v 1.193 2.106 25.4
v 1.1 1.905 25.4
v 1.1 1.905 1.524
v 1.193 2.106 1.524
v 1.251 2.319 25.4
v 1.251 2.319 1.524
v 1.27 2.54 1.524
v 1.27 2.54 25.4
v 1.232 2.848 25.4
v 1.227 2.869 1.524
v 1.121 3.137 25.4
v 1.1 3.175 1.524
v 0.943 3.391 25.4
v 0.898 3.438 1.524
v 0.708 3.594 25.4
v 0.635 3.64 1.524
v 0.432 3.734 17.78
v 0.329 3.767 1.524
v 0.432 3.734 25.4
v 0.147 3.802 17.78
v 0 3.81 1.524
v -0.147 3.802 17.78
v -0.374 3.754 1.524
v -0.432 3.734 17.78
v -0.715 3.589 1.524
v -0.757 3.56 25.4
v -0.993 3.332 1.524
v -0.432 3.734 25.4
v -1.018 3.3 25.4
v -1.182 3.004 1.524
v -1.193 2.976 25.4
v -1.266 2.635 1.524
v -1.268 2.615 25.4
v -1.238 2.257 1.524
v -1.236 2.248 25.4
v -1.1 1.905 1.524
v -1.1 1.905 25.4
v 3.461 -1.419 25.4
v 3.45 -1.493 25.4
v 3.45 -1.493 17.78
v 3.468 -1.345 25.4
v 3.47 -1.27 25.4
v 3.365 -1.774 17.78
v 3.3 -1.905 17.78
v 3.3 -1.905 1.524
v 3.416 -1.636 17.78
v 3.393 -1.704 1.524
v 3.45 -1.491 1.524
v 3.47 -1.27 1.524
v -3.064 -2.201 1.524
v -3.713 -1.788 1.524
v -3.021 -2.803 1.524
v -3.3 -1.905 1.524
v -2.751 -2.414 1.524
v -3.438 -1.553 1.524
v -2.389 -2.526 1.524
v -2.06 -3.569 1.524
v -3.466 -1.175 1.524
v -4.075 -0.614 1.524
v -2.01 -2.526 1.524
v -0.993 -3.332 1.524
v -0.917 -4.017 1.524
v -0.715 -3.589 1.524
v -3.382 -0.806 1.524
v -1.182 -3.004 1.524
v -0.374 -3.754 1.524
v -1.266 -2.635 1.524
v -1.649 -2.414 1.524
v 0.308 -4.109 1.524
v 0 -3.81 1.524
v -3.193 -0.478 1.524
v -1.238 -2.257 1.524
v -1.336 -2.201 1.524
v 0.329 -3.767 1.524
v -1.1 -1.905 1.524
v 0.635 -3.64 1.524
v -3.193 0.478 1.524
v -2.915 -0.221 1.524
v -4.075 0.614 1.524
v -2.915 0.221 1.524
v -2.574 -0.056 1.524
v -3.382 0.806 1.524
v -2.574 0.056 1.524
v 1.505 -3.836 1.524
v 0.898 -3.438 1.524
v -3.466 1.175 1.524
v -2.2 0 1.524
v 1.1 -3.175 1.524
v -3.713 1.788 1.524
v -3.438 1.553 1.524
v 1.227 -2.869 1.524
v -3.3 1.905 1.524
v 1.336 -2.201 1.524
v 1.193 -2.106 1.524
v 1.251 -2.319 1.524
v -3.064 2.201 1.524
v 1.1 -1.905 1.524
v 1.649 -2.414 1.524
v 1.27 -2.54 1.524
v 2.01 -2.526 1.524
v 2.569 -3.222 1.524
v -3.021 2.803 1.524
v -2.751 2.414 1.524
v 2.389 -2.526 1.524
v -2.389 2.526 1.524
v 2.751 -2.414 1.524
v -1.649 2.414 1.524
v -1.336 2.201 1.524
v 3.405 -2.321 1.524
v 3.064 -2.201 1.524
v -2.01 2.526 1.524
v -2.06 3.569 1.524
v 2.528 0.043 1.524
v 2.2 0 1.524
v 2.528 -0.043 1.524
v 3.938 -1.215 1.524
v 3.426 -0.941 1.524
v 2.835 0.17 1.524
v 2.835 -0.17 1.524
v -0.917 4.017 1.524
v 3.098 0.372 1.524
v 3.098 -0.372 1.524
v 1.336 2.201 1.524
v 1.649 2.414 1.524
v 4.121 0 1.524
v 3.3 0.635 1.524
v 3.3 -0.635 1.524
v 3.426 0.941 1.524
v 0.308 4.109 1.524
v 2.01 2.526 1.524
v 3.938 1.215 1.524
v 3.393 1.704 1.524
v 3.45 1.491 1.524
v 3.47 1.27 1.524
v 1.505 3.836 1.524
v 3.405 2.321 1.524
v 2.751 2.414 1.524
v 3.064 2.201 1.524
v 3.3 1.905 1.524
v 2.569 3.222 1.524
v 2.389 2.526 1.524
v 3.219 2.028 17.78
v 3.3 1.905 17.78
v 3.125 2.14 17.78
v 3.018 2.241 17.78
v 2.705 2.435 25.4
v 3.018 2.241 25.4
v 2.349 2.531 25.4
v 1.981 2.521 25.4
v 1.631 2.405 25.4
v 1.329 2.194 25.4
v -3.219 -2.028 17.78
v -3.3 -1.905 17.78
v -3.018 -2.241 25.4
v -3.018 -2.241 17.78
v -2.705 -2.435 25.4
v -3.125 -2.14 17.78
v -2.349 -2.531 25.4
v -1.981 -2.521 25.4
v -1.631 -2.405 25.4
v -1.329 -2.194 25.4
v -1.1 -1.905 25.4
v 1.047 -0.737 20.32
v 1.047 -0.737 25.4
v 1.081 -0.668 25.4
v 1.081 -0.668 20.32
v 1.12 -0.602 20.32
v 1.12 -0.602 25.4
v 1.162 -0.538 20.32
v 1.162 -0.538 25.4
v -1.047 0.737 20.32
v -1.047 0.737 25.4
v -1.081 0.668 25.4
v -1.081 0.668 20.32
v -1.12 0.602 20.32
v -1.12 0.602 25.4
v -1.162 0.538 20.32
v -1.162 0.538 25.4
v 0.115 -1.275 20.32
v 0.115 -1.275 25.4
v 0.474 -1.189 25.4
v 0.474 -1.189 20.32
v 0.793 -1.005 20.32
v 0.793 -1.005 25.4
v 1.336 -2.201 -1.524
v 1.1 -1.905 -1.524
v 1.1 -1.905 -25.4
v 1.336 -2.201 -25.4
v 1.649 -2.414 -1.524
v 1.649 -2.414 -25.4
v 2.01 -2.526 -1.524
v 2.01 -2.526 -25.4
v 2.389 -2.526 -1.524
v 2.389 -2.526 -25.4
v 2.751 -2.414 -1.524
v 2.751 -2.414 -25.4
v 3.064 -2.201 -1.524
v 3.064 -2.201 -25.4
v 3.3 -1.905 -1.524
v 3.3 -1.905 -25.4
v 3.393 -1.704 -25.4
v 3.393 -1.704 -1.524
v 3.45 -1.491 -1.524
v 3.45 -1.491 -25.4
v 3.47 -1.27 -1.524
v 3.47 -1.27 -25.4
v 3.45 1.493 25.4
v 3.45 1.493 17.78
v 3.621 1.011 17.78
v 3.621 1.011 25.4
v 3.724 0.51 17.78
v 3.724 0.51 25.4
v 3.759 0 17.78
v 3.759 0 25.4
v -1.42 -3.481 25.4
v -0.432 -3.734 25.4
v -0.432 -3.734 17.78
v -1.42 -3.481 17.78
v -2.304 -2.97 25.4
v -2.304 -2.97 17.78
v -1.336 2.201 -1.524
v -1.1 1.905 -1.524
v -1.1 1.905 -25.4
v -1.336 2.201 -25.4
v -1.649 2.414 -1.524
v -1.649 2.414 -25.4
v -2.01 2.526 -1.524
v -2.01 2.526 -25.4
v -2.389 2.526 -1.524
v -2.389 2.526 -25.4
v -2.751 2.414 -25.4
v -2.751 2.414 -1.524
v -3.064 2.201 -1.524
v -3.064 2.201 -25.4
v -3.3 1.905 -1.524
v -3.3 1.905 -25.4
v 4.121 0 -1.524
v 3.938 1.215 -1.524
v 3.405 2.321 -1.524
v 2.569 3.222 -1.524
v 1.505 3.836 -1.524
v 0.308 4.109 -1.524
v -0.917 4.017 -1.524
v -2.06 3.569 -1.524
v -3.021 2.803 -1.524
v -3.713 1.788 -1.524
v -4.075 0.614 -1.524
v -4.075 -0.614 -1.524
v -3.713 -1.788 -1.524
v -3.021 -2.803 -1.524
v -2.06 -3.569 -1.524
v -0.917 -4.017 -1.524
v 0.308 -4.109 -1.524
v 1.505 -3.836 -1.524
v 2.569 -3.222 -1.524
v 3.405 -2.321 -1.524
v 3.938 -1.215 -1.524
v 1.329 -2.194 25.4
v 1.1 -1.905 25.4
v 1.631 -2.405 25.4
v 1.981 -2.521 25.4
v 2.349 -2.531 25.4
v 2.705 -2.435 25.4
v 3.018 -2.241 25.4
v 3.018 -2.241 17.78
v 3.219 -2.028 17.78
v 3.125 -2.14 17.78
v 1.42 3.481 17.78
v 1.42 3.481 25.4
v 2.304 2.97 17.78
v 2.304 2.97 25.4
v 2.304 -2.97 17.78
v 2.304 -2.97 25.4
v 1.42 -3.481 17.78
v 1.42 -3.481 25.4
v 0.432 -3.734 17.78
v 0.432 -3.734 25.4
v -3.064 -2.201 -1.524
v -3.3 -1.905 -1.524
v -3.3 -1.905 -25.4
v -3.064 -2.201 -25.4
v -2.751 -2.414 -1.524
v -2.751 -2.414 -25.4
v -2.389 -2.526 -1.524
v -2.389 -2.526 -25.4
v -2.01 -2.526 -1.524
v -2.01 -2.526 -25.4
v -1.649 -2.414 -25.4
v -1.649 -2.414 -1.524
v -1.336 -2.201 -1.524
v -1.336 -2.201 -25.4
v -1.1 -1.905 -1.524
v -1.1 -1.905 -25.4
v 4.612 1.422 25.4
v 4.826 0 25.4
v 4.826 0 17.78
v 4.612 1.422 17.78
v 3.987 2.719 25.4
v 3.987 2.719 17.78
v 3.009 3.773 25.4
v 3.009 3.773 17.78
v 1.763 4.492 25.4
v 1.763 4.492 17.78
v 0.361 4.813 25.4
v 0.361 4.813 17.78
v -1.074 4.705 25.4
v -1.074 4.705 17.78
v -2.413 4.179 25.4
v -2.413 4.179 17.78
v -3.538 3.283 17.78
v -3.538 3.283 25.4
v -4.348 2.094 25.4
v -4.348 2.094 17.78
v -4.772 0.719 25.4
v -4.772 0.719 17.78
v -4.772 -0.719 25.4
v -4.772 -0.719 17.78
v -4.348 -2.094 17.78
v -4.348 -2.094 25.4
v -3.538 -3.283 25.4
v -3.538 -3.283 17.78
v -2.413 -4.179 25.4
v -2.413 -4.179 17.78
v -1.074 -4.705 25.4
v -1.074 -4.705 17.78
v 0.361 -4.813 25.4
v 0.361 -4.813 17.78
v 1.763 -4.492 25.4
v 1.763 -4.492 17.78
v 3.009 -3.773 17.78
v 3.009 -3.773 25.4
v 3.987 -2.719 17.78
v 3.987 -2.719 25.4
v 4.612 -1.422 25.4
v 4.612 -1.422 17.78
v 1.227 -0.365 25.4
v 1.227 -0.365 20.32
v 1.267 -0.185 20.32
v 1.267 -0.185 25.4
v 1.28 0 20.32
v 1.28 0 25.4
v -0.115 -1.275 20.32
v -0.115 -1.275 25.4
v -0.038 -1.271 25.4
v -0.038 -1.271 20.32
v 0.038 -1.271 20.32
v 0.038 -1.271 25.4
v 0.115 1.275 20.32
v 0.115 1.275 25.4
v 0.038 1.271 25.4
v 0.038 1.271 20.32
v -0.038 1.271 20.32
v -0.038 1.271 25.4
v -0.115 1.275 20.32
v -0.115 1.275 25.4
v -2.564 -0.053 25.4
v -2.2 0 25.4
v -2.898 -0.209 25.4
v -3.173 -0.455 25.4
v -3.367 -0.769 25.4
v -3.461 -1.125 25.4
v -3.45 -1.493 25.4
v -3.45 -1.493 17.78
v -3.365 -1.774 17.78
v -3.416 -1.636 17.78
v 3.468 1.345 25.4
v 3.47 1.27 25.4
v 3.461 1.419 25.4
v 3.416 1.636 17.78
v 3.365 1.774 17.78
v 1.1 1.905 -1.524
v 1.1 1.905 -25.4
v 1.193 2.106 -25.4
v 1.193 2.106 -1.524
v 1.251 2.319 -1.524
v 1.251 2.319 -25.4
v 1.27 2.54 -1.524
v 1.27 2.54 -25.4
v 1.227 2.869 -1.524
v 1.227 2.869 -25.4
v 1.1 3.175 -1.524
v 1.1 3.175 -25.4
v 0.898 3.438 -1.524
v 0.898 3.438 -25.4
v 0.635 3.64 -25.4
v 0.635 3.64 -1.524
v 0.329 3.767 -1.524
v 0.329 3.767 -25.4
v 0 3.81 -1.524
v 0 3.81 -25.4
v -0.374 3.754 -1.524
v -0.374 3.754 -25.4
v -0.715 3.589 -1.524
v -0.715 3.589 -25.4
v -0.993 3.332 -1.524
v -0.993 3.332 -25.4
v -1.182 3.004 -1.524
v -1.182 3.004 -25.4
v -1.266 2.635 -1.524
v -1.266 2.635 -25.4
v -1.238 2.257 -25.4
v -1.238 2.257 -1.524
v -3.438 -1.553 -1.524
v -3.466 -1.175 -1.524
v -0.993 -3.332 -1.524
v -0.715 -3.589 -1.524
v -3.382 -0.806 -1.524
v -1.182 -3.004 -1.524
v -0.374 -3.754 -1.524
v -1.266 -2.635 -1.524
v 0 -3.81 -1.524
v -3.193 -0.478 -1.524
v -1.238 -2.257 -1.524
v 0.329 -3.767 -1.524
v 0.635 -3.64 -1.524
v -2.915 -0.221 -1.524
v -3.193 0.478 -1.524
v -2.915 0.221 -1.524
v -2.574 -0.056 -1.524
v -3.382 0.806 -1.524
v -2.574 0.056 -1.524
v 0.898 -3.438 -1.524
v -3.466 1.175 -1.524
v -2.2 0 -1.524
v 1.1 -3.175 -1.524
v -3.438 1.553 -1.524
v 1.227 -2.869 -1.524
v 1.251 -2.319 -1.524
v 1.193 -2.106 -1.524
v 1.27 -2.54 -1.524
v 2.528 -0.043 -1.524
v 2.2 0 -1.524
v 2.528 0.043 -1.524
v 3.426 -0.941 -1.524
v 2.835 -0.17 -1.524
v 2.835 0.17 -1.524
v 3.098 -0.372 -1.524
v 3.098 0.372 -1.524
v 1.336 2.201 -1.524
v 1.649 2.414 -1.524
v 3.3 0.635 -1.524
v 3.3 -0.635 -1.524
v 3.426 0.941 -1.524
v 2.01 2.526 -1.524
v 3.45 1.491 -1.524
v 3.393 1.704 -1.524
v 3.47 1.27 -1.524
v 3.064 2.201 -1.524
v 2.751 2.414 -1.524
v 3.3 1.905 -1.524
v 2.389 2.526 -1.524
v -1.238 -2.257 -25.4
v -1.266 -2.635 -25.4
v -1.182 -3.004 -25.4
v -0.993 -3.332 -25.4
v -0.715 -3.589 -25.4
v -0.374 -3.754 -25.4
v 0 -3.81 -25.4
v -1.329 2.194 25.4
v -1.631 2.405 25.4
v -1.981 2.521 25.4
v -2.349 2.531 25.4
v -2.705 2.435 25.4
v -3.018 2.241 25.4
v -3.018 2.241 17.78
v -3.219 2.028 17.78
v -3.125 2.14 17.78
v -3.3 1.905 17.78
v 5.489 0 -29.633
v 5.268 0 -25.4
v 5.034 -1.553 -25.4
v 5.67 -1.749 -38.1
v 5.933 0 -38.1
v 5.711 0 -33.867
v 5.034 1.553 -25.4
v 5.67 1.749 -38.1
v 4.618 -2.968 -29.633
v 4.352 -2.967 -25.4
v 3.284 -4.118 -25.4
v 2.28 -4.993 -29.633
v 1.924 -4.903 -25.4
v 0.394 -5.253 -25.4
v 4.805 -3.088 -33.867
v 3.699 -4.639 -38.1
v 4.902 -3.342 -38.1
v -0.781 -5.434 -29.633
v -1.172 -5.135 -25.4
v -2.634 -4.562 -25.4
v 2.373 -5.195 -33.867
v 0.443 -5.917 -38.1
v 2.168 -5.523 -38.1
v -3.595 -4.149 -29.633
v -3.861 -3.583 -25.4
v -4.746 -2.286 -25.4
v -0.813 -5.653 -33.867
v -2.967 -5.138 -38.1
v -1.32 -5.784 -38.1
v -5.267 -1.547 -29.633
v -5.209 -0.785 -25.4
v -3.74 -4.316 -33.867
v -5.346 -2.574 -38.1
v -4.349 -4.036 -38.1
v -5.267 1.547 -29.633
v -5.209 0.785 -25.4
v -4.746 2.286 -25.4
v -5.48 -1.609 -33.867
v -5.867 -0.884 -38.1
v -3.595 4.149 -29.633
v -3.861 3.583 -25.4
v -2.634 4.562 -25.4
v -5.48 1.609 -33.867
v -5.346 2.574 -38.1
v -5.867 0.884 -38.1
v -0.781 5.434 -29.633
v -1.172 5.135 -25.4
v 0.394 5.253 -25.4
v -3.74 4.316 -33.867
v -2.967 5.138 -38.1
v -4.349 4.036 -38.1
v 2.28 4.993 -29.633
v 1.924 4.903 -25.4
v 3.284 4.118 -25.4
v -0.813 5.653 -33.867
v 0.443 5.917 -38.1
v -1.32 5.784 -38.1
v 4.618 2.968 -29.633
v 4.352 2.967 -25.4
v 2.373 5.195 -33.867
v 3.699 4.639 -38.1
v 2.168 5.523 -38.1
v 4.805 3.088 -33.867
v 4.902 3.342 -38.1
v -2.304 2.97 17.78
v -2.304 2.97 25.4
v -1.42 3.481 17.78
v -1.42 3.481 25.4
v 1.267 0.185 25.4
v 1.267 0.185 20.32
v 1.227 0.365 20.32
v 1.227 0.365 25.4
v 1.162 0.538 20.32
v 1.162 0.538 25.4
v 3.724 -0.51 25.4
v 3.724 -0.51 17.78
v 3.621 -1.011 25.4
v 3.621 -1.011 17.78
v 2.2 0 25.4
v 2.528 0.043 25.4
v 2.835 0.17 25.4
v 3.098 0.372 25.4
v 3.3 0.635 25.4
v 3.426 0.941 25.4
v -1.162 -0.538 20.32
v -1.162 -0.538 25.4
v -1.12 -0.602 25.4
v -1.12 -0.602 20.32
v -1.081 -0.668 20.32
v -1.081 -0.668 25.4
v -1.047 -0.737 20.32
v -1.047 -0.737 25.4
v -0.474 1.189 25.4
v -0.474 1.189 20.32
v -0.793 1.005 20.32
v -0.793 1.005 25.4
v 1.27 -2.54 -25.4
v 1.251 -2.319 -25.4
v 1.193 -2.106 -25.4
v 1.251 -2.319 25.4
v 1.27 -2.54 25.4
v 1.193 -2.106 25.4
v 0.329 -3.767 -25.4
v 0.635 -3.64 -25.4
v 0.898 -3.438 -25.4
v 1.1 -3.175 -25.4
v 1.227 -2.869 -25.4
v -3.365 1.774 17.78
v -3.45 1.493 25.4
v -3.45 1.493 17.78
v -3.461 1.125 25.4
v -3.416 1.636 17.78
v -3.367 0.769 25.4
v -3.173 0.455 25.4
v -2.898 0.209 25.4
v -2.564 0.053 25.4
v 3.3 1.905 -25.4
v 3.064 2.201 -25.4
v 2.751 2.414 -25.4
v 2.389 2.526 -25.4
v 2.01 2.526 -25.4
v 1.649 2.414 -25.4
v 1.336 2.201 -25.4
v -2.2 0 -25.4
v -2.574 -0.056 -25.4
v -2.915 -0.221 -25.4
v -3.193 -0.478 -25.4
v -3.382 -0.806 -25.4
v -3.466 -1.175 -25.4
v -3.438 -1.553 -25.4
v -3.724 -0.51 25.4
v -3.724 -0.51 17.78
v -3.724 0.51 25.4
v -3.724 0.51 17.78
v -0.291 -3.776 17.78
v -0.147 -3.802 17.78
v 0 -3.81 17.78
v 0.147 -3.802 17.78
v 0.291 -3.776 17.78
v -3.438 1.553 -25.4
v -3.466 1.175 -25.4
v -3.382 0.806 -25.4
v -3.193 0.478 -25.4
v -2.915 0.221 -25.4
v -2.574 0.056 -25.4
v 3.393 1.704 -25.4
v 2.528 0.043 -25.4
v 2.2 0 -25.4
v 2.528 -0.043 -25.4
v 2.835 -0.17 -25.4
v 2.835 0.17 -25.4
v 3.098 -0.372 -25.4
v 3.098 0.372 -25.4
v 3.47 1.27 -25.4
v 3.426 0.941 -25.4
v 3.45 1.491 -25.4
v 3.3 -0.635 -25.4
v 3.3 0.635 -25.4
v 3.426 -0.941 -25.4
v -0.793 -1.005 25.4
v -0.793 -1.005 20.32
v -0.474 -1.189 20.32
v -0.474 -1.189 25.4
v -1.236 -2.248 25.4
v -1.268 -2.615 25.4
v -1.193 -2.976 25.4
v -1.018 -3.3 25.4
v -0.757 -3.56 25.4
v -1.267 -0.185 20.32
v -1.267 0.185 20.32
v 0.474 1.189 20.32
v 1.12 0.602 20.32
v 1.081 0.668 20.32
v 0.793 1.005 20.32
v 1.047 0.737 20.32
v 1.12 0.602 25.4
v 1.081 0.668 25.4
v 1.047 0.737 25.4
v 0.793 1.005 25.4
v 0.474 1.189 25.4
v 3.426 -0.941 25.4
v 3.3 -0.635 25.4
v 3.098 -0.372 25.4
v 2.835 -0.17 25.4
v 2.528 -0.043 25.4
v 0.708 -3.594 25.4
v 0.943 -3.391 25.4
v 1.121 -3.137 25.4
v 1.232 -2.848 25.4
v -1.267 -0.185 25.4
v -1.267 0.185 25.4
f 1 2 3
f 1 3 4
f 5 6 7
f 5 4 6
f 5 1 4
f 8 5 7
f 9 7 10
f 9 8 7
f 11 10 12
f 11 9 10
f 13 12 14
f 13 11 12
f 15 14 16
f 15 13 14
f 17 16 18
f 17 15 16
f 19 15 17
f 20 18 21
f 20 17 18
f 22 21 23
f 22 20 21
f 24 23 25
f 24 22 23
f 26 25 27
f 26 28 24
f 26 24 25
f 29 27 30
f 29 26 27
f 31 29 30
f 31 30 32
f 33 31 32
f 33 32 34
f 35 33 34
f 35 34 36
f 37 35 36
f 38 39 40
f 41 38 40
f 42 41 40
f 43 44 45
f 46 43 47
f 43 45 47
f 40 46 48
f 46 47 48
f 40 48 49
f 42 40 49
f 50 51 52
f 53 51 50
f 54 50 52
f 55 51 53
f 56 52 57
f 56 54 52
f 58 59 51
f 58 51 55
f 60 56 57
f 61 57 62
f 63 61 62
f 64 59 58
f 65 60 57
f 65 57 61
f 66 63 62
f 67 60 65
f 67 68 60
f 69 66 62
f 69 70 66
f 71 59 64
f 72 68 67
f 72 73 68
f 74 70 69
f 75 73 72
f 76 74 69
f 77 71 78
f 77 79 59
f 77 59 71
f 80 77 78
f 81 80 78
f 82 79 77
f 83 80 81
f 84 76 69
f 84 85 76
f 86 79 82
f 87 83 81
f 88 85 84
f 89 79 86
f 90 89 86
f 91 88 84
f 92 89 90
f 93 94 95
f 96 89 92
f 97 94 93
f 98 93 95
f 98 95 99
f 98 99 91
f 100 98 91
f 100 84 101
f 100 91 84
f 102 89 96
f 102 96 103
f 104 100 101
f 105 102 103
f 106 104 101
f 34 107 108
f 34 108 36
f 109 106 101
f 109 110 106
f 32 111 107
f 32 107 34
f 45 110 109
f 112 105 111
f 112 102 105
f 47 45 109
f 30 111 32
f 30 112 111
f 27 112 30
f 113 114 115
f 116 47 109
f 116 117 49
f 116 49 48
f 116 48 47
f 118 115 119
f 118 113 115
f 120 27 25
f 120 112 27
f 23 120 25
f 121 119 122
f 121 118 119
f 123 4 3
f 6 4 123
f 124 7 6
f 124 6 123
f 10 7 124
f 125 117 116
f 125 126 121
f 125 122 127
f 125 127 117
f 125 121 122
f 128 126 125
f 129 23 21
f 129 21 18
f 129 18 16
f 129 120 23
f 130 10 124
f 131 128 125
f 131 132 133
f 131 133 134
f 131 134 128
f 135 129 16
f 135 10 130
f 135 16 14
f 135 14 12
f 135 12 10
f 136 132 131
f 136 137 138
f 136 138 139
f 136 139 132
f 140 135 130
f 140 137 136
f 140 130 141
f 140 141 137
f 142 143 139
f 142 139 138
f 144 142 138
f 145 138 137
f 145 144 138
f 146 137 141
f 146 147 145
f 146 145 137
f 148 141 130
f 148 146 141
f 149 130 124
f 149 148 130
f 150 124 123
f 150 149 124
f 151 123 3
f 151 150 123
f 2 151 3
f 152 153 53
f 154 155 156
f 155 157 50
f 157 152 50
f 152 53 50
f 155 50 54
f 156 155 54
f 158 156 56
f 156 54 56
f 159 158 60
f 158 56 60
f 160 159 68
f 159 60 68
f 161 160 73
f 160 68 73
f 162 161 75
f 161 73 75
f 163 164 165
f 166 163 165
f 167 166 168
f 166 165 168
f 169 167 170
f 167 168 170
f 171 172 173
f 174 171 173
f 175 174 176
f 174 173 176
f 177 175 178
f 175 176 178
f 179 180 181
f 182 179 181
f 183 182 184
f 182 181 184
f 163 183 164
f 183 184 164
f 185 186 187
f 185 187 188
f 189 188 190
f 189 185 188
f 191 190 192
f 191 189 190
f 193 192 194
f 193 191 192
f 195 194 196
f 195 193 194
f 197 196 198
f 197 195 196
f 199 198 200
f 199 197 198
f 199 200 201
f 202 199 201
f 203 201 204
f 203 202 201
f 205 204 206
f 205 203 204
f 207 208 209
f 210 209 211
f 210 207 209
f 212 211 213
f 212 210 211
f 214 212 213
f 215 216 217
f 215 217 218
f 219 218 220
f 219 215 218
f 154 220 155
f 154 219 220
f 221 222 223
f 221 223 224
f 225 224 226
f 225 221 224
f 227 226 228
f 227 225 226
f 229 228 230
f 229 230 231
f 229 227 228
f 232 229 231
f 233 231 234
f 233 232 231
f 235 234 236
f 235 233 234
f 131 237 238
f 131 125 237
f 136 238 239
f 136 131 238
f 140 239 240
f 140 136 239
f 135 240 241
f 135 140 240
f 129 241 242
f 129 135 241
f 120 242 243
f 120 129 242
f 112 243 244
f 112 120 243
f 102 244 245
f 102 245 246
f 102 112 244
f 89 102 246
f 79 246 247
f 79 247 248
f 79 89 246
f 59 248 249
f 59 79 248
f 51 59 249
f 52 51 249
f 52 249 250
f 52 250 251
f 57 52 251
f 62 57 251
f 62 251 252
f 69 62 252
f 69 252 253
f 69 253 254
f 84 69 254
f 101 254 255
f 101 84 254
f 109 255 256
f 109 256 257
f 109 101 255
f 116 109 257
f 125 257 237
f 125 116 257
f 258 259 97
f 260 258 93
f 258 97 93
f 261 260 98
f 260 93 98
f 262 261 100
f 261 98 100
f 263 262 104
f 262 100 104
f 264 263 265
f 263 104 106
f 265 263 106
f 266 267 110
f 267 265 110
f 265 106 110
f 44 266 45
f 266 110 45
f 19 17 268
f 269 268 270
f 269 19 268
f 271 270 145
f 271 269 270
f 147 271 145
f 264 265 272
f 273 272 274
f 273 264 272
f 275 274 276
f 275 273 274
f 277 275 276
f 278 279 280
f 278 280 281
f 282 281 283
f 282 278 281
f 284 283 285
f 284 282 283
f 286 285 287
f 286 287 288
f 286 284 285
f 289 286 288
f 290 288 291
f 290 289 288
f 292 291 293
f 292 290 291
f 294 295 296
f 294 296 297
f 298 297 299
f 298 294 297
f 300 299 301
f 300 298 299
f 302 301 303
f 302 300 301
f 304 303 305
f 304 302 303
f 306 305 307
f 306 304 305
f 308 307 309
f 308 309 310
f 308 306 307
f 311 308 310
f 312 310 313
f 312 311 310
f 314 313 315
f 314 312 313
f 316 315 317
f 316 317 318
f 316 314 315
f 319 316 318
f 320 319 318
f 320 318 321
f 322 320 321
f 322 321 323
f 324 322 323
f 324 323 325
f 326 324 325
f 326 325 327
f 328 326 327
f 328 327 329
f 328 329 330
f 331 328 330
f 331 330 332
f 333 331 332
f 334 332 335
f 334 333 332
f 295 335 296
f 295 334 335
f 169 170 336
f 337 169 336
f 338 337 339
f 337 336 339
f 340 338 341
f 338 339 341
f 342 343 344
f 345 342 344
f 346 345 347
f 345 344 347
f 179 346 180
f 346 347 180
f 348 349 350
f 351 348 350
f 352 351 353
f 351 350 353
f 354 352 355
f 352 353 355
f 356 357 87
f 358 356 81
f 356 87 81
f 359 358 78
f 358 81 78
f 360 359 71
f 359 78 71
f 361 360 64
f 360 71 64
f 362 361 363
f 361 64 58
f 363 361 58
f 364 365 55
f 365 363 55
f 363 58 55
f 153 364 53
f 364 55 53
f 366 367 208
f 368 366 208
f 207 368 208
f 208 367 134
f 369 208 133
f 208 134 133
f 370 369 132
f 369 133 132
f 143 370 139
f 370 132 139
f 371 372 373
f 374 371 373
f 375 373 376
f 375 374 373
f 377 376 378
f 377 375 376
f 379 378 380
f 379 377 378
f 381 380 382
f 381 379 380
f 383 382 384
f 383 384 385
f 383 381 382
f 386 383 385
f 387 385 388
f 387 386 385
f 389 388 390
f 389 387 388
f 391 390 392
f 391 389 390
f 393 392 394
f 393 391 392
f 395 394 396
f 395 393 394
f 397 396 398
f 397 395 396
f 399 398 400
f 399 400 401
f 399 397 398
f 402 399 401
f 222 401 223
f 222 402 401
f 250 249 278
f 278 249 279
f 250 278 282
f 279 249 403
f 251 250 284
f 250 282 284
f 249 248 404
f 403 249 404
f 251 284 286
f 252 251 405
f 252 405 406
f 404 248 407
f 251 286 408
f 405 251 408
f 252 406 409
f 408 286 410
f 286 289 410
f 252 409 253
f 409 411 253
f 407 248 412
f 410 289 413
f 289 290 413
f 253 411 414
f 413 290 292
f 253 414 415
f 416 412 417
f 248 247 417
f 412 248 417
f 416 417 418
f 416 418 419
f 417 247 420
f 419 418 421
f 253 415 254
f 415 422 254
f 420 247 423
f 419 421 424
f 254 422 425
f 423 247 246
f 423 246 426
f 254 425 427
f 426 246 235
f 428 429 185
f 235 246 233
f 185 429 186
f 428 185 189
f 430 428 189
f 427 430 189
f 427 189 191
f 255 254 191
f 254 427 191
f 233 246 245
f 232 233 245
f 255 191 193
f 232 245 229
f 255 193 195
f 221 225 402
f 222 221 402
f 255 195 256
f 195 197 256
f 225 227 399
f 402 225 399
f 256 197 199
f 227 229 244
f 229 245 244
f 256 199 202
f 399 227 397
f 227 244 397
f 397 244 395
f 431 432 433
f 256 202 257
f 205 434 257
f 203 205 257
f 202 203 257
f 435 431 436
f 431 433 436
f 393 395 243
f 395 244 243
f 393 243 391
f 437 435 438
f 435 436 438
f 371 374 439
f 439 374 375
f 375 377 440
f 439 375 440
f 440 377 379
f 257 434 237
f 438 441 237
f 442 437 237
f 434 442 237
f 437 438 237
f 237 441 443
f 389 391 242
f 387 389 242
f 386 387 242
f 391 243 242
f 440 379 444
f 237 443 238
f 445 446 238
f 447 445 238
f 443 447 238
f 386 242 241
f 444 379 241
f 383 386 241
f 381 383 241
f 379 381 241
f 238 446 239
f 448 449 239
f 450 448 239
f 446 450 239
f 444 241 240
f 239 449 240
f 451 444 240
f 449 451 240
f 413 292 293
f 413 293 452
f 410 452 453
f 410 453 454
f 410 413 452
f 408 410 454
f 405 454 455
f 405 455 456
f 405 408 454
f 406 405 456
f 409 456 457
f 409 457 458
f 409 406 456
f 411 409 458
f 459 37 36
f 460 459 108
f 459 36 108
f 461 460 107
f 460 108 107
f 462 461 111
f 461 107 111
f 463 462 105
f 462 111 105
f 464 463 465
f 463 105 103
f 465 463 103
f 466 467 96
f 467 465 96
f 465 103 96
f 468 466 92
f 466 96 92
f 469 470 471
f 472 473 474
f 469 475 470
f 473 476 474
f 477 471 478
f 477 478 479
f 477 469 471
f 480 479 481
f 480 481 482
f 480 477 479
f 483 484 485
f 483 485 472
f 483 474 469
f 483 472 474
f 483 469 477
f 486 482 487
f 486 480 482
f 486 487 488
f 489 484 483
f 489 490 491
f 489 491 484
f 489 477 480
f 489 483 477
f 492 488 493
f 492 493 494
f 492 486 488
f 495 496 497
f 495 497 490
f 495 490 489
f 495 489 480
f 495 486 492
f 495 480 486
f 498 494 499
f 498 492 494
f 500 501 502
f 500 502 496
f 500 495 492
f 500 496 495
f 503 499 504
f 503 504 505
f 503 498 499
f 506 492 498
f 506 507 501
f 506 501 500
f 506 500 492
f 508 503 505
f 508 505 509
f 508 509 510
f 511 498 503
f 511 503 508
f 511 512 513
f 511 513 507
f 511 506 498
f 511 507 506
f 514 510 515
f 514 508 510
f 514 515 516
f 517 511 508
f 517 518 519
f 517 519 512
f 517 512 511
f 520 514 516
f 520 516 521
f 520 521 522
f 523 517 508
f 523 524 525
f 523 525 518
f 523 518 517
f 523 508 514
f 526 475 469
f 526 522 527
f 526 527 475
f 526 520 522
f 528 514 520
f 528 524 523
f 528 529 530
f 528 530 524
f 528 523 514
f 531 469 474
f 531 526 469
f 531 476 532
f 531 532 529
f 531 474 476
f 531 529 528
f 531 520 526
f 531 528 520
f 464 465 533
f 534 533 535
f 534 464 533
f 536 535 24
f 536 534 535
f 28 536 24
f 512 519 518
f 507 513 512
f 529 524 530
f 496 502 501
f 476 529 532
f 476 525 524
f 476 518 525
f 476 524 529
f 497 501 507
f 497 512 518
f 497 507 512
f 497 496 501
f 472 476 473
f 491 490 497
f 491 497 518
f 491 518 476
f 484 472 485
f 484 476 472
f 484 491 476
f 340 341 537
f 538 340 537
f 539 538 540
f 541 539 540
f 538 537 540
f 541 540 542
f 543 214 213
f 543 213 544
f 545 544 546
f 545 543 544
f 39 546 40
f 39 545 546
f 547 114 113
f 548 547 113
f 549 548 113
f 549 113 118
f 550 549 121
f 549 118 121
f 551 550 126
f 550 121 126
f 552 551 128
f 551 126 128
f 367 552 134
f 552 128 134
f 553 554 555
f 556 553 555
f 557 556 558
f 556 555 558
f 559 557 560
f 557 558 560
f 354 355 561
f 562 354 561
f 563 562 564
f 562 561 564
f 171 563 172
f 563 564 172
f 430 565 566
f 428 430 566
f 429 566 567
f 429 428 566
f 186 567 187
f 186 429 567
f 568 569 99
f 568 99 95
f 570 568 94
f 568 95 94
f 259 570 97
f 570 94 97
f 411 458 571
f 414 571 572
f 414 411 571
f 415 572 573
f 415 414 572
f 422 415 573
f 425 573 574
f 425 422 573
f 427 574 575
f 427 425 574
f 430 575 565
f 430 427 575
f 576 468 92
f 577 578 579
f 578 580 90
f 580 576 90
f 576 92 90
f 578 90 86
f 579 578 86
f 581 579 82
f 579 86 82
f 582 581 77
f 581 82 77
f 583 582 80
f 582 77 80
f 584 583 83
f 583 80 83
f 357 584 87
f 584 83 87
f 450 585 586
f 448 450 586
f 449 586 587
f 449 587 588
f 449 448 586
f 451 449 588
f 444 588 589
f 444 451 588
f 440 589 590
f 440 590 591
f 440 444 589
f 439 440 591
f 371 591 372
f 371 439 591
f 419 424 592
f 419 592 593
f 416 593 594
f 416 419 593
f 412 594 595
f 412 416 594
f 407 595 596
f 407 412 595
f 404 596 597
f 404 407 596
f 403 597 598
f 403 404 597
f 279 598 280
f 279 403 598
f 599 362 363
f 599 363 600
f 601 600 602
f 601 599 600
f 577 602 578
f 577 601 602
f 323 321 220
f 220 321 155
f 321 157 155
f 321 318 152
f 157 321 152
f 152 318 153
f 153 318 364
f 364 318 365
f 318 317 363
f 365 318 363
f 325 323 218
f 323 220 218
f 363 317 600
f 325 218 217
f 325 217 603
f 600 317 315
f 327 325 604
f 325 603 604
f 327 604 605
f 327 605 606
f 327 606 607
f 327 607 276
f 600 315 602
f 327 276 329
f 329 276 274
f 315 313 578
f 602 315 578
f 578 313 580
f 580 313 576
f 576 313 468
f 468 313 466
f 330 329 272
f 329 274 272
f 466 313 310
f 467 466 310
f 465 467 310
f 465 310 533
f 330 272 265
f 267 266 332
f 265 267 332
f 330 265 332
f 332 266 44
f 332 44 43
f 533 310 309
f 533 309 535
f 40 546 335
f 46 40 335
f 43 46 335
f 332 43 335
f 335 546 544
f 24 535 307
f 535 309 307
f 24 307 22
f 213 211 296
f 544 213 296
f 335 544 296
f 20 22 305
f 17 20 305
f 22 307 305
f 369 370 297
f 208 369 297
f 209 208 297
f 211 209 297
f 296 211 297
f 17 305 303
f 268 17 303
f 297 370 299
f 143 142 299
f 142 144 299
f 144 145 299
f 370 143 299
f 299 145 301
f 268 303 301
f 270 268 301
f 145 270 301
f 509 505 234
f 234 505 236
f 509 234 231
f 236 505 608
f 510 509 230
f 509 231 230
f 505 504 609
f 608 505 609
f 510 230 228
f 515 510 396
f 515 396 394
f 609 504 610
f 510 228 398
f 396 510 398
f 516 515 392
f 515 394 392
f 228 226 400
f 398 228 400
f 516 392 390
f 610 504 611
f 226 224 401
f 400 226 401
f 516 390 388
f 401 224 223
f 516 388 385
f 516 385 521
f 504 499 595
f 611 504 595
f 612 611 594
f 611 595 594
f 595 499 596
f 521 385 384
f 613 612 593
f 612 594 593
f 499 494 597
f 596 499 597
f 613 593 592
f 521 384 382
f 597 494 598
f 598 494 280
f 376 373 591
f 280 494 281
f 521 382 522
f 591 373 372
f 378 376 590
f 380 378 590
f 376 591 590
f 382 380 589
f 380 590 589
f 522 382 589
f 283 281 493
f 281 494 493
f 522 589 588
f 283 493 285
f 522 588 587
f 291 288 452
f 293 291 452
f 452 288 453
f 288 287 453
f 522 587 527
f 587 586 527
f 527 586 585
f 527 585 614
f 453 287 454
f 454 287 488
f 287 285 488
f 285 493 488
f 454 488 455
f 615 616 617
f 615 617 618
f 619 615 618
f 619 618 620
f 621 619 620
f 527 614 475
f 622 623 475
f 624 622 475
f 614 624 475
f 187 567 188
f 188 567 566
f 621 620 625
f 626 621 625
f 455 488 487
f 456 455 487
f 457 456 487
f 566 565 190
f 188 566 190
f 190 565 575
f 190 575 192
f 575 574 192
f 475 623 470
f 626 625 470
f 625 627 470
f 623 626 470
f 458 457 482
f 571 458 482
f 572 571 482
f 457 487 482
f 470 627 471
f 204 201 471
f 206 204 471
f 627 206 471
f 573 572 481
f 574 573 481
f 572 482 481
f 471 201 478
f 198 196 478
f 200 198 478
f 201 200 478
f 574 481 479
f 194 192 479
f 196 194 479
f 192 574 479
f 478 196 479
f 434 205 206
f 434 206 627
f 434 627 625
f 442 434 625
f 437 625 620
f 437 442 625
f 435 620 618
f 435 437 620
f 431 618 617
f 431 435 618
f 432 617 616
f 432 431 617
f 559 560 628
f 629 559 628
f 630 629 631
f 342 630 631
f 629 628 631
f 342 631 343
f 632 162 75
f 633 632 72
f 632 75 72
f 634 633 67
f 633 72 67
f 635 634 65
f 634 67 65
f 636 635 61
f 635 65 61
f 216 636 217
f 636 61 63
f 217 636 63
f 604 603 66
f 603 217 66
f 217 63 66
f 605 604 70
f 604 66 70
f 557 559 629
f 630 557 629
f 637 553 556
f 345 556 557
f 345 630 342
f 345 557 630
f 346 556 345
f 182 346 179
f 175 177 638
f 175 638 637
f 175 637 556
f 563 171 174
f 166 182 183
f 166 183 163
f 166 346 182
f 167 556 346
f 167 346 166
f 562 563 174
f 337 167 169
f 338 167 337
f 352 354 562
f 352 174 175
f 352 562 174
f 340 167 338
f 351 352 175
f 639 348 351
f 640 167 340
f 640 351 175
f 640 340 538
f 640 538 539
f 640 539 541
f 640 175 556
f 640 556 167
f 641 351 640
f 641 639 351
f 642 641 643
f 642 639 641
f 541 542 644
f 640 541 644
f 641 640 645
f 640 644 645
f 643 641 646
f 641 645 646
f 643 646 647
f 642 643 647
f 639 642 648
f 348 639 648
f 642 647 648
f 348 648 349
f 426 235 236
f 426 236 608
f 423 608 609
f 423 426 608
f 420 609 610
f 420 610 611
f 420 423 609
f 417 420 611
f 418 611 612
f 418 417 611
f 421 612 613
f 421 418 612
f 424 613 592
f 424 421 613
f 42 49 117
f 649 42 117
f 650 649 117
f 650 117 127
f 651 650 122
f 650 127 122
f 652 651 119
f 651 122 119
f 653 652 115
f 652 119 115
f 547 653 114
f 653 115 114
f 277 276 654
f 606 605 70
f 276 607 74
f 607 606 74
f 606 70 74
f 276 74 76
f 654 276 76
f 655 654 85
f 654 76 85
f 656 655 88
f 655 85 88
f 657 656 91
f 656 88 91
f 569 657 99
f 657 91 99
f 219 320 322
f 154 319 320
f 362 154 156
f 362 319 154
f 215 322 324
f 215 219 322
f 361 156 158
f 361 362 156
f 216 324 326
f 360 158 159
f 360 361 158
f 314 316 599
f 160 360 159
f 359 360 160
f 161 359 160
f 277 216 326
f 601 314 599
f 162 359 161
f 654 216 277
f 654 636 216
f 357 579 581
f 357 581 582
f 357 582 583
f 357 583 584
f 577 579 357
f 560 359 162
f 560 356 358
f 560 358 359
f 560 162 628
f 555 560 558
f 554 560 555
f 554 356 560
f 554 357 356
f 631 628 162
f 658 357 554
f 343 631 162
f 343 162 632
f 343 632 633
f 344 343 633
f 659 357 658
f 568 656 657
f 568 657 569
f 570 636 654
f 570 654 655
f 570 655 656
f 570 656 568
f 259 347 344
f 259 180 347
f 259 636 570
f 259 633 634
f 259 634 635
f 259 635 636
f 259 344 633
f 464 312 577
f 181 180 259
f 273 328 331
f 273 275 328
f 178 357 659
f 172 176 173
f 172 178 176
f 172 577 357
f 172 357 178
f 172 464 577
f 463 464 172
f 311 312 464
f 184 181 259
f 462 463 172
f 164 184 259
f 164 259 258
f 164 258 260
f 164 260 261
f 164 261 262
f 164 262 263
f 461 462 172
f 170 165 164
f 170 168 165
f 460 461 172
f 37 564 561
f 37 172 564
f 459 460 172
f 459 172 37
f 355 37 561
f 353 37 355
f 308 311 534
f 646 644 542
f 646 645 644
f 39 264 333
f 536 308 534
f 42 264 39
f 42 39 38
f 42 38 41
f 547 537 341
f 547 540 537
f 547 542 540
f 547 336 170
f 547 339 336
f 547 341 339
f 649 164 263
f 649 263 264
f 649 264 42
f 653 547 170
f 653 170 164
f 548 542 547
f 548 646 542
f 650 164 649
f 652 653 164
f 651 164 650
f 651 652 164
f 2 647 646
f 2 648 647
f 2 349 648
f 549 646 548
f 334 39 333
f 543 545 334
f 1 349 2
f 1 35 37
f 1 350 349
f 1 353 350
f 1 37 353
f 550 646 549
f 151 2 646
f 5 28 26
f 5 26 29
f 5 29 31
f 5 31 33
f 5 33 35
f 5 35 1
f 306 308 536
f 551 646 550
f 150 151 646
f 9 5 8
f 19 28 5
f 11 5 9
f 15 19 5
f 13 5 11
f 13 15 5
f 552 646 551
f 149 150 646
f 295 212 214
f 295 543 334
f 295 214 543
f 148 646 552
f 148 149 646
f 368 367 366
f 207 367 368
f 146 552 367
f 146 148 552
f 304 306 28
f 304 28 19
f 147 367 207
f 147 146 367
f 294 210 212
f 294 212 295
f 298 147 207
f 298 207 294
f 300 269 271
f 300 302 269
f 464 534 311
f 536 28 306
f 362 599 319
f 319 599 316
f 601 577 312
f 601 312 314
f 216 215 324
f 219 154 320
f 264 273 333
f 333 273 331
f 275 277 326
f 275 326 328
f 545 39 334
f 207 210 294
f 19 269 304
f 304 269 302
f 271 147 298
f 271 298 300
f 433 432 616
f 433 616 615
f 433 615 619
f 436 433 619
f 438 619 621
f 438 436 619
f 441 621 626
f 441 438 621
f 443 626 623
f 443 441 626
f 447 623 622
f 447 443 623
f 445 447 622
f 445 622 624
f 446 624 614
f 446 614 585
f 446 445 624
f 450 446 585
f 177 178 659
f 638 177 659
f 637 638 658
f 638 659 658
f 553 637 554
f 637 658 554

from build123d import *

# Parameters (mm, degrees)
F1_DEPTH = 25.4
F0_R     = 4.1207252188
F2_DEPTH = 1.524
F4_DEPTH = 5.08
F5_R     = 4.826
F6_DEPTH = 7.62
F8_R     = 5.2675515525
F9_DEPTH = 12.7
F9_TAPER = -3


with BuildPart() as f1:
    # F0 (on Top) → F1 (new body, symmetric)
    with BuildSketch(Plane.XY):
        with BuildLine():
            ThreePointArc((1.0998522687, -0.6349999897), (1.2267258009, -0.3287001815), (1.27, 0))
            ThreePointArc((1.27, 0), (1.2267257989, 0.328700189), (1.0998522611, 0.635000003))
            ThreePointArc((1.0998522611, 0.635000003), (0.6349999985, 1.0998522637), (0, 1.27))
            ThreePointArc((0, 1.27), (-0.6349999991, 1.0998522633), (-1.0998522618, 0.6350000018))
            ThreePointArc((-1.0998522618, 0.6350000018), (-1.27, 3.4e-09), (-1.0998522652, -0.6349999959))
            ThreePointArc((-1.0998522652, -0.6349999959), (-0.6350000021, -1.0998522616), (0, -1.27))
            ThreePointArc((0, -1.27), (0.6350000051, -1.0998522598), (1.0998522687, -0.6349999897))
        make_face()
        with BuildLine():
            ThreePointArc((-1.0998522618, 0.6350000018), (-0.6349999991, 1.0998522633), (0, 1.27))
            ThreePointArc((0, 1.27), (-0.6350000007, 1.4401477376), (-1.0998522636, 1.9050000014))
            ThreePointArc((-1.0998522636, 1.9050000014), (-0.9729787264, 1.5987001881), (-0.9297045256, 1.27))
            ThreePointArc((-0.9297045256, 1.27), (-0.972978726, 0.9412998137), (-1.0998522618, 0.6350000018))
        make_face()
        with BuildLine():
            ThreePointArc((0, 1.27), (0.6349999985, 1.0998522637), (1.0998522611, 0.635000003))
            ThreePointArc((1.0998522611, 0.635000003), (0.9297045256, 1.2699999943), (1.0998522553, 1.904999987))
            ThreePointArc((1.0998522553, 1.904999987), (0.6349999935, 1.4401477334), (0, 1.27))
        make_face()
        with BuildLine():
            ThreePointArc((1.0998522611, 0.635000003), (1.2267257989, 0.328700189), (1.27, 0))
            ThreePointArc((1.27, 0), (1.2267258009, -0.3287001815), (1.0998522687, -0.6349999897))
            ThreePointArc((1.0998522687, -0.6349999897), (1.5647045337, -0.1701477325), (2.1997045323, 0))
            ThreePointArc((2.1997045323, 0), (1.564704527, 0.1701477364), (1.0998522611, 0.635000003))
        make_face()
        with BuildLine():
            ThreePointArc((1.0998522687, -1.9050000103), (0.9297045256, -1.27), (1.0998522687, -0.6349999897))
            ThreePointArc((1.0998522687, -0.6349999897), (0.6350000051, -1.0998522598), (0, -1.27))
            ThreePointArc((0, -1.27), (0.6350000051, -1.4401477402), (1.0998522687, -1.9050000103))
        make_face()
        with BuildLine():
            ThreePointArc((-1.0998522652, -1.9050000041), (-0.635000002, -1.4401477384), (0, -1.27))
            ThreePointArc((0, -1.27), (-0.6350000021, -1.0998522616), (-1.0998522652, -0.6349999959))
            ThreePointArc((-1.0998522652, -0.6349999959), (-0.9729787268, -0.9412998104), (-0.9297045256, -1.27))
            ThreePointArc((-0.9297045256, -1.27), (-0.9729787268, -1.5987001896), (-1.0998522652, -1.9050000041))
        make_face()
        with BuildLine():
            ThreePointArc((-1.0998522652, -0.6349999959), (-1.27, 3.4e-09), (-1.0998522618, 0.6350000018))
            ThreePointArc((-1.0998522618, 0.6350000018), (-1.5647045247, 0.1701477377), (-2.1997045256, 0))
            ThreePointArc((-2.1997045256, 0), (-1.5647045277, -0.170147736), (-1.0998522652, -0.6349999959))
        make_face()
        with BuildLine():
            ThreePointArc((-1.0998522636, 1.9050000014), (-0.6350000007, 1.4401477376), (0, 1.27))
            ThreePointArc((0, 1.27), (0.6349999935, 1.4401477334), (1.0998522553, 1.904999987))
            ThreePointArc((1.0998522553, 1.904999987), (1.2267257974, 2.2112998055), (1.27, 2.54))
            ThreePointArc((1.27, 2.54), (0.8980256121, 3.4380256121), (0, 3.81))
            ThreePointArc((0, 3.81), (-1.0998522624, 3.1750000007), (-1.0998522636, 1.9050000014))
        make_face()
        with BuildLine():
            ThreePointArc((-2.1997045256, 0), (-1.5647045247, 0.1701477377), (-1.0998522618, 0.6350000018))
            ThreePointArc((-1.0998522618, 0.6350000018), (-0.972978726, 0.9412998137), (-0.9297045256, 1.27))
            ThreePointArc((-0.9297045256, 1.27), (-0.9729787264, 1.5987001881), (-1.0998522636, 1.9050000014))
            ThreePointArc((-1.0998522636, 1.9050000014), (-2.1997045238, 2.54), (-3.2995567858, 1.9050000045))
            ThreePointArc((-3.2995567858, 1.9050000045), (-3.2995567897, 0.6350000022), (-2.1997045256, 0))
        make_face()
        with BuildLine():
            ThreePointArc((-0.9297045256, -1.27), (-0.9729787268, -0.9412998104), (-1.0998522652, -0.6349999959))
            ThreePointArc((-1.0998522652, -0.6349999959), (-1.5647045277, -0.170147736), (-2.1997045256, 0))
            ThreePointArc((-2.1997045256, 0), (-3.2995568097, -0.6350000369), (-3.2995567458, -1.9050000739))
            ThreePointArc((-3.2995567458, -1.9050000739), (-2.1997044853, -2.54), (-1.0998522652, -1.9050000041))
            ThreePointArc((-1.0998522652, -1.9050000041), (-0.9729787268, -1.5987001896), (-0.9297045256, -1.27))
        make_face()
        with BuildLine():
            ThreePointArc((1.0998522687, -1.9050000103), (0.6350000051, -1.4401477402), (0, -1.27))
            ThreePointArc((0, -1.27), (-0.635000002, -1.4401477384), (-1.0998522652, -1.9050000041))
            ThreePointArc((-1.0998522652, -1.9050000041), (-1.0998522616, -3.175000002), (0, -3.81))
            ThreePointArc((0, -3.81), (0.8980256121, -3.4380256121), (1.27, -2.54))
            ThreePointArc((1.27, -2.54), (1.2267258009, -2.2112998185), (1.0998522687, -1.9050000103))
        make_face()
        with BuildLine():
            ThreePointArc((2.1997045323, 0), (1.5647045337, -0.1701477325), (1.0998522687, -0.6349999897))
            ThreePointArc((1.0998522687, -0.6349999897), (0.9297045256, -1.27), (1.0998522687, -1.9050000103))
            ThreePointArc((1.0998522687, -1.9050000103), (2.1997045101, -2.54), (3.299556767, -1.9050000371))
            ThreePointArc((3.299556767, -1.9050000371), (3.4264303195, -1.598700208), (3.4697045256, -1.27))
            ThreePointArc((3.4697045256, -1.27), (3.0977301401, -0.3719743903), (2.1997045323, 0))
        make_face()
        with BuildLine():
            ThreePointArc((1.0998522553, 1.904999987), (0.9297045256, 1.2699999943), (1.0998522611, 0.635000003))
            ThreePointArc((1.0998522611, 0.635000003), (1.564704527, 0.1701477364), (2.1997045323, 0))
            ThreePointArc((2.1997045323, 0), (3.0977301401, 0.3719743903), (3.4697045256, 1.27))
            ThreePointArc((3.4697045256, 1.27), (3.4264303195, 1.598700208), (3.299556767, 1.9050000371))
            ThreePointArc((3.299556767, 1.9050000371), (2.1997044967, 2.54), (1.0998522553, 1.904999987))
        make_face()
    extrude(amount=F1_DEPTH, both=True)

    # F0 (on Top) → F2 (join, symmetric)
    with BuildSketch(Plane.XY):
        Circle(F0_R)
        with BuildLine():
            ThreePointArc((0, 3.81), (1.9049999814, 3.2995567991), (3.299556767, 1.9050000371))
            ThreePointArc((3.299556767, 1.9050000371), (3.6801773926, 0.9861005825), (3.81, 0))
            ThreePointArc((3.81, 0), (3.6801773926, -0.9861005825), (3.299556767, -1.9050000371))
            ThreePointArc((3.299556767, -1.9050000371), (1.9049999814, -3.2995567991), (0, -3.81))
            ThreePointArc((0, -3.81), (-1.9049999631, -3.2995568097), (-3.2995567458, -1.9050000739))
            ThreePointArc((-3.2995567458, -1.9050000739), (-3.81, -4.01e-08), (-3.2995567858, 1.9050000045))
            ThreePointArc((-3.2995567858, 1.9050000045), (-1.9049999978, 3.2995567897), (0, 3.81))
        make_face(mode=Mode.SUBTRACT)
        with BuildLine():
            ThreePointArc((-3.2995567858, 1.9050000045), (-2.1997045238, 2.54), (-1.0998522636, 1.9050000014))
            ThreePointArc((-1.0998522636, 1.9050000014), (-1.0998522624, 3.1750000007), (0, 3.81))
            ThreePointArc((0, 3.81), (-1.9049999978, 3.2995567897), (-3.2995567858, 1.9050000045))
        make_face()
        with BuildLine():
            ThreePointArc((1.27, 2.54), (1.2267257974, 2.2112998055), (1.0998522553, 1.904999987))
            ThreePointArc((1.0998522553, 1.904999987), (2.1997044967, 2.54), (3.299556767, 1.9050000371))
            ThreePointArc((3.299556767, 1.9050000371), (1.9049999814, 3.2995567991), (0, 3.81))
            ThreePointArc((0, 3.81), (0.8980256121, 3.4380256121), (1.27, 2.54))
        make_face()
        with BuildLine():
            ThreePointArc((3.4697045256, 1.27), (3.0977301401, 0.3719743903), (2.1997045323, 0))
            ThreePointArc((2.1997045323, 0), (3.0977301401, -0.3719743903), (3.4697045256, -1.27))
            ThreePointArc((3.4697045256, -1.27), (3.4264303195, -1.598700208), (3.299556767, -1.9050000371))
            ThreePointArc((3.299556767, -1.9050000371), (3.6801773926, -0.9861005825), (3.81, 0))
            ThreePointArc((3.81, 0), (3.6801773926, 0.9861005825), (3.299556767, 1.9050000371))
            ThreePointArc((3.299556767, 1.9050000371), (3.4264303195, 1.598700208), (3.4697045256, 1.27))
        make_face()
        with BuildLine():
            ThreePointArc((3.299556767, -1.9050000371), (2.1997045101, -2.54), (1.0998522687, -1.9050000103))
            ThreePointArc((1.0998522687, -1.9050000103), (1.2267258009, -2.2112998185), (1.27, -2.54))
            ThreePointArc((1.27, -2.54), (0.8980256121, -3.4380256121), (0, -3.81))
            ThreePointArc((0, -3.81), (1.9049999814, -3.2995567991), (3.299556767, -1.9050000371))
        make_face()
        with BuildLine():
            ThreePointArc((0, -3.81), (-1.0998522616, -3.175000002), (-1.0998522652, -1.9050000041))
            ThreePointArc((-1.0998522652, -1.9050000041), (-2.1997044853, -2.54), (-3.2995567458, -1.9050000739))
            ThreePointArc((-3.2995567458, -1.9050000739), (-1.9049999631, -3.2995568097), (0, -3.81))
        make_face()
        with BuildLine():
            ThreePointArc((-3.2995567458, -1.9050000739), (-3.2995568097, -0.6350000369), (-2.1997045256, 0))
            ThreePointArc((-2.1997045256, 0), (-3.2995567897, 0.6350000022), (-3.2995567858, 1.9050000045))
            ThreePointArc((-3.2995567858, 1.9050000045), (-3.81, -4.01e-08), (-3.2995567458, -1.9050000739))
        make_face()
    extrude(amount=F2_DEPTH, both=True)

    # F3 (on face) → F4 (cut)
    with BuildSketch(Plane.XY.offset(25.4)):
        with BuildLine():
            ThreePointArc((1.1617240994, -0.5382236443), (1.2503393833, -0.2755703193), (1.2803466618, 0))
            ThreePointArc((1.2803466618, 0), (1.2503393833, 0.2755703193), (1.1617240994, 0.5382236443))
            ThreePointArc((1.1617240994, 0.5382236443), (1.0998522628, 0.635), (1.0469773986, 0.7369707601))
            ThreePointArc((1.0469773986, 0.7369707601), (0.6401733309, 1.1088127348), (0.1147467008, 1.2751944044))
            ThreePointArc((0.1147467008, 1.2751944044), (0, 1.27), (-0.1147467008, 1.2751944044))
            ThreePointArc((-0.1147467008, 1.2751944044), (-0.6401733309, 1.1088127348), (-1.0469773986, 0.7369707601))
            ThreePointArc((-1.0469773986, 0.7369707601), (-1.0998522628, 0.635), (-1.1617240994, 0.5382236443))
            ThreePointArc((-1.1617240994, 0.5382236443), (-1.2803466618, 0), (-1.1617240994, -0.5382236443))
            ThreePointArc((-1.1617240994, -0.5382236443), (-1.0998522628, -0.635), (-1.0469773986, -0.7369707601))
            ThreePointArc((-1.0469773986, -0.7369707601), (-0.6401733309, -1.1088127348), (-0.1147467008, -1.2751944044))
            ThreePointArc((-0.1147467008, -1.2751944044), (0, -1.27), (0.1147467008, -1.2751944044))
            ThreePointArc((0.1147467008, -1.2751944044), (0.6401733309, -1.1088127348), (1.0469773986, -0.7369707601))
            ThreePointArc((1.0469773986, -0.7369707601), (1.0998522628, -0.635), (1.1617240994, -0.5382236443))
        make_face()
    extrude(amount=-F4_DEPTH, mode=Mode.SUBTRACT)

    # F5 (on face) → F6 (join)
    with BuildSketch(Plane.XY.offset(25.4)):
        Circle(F5_R)
        with BuildLine():
            ThreePointArc((0.4317572455, 3.7343557598), (2.8066798027, 2.5008749959), (3.75923227, 0))
            ThreePointArc((3.75923227, 0), (-2.5008749959, -2.8066798027), (-0.4317572455, 3.7343557598))
            ThreePointArc((-0.4317572455, 3.7343557598), (0, 3.81), (0.4317572455, 3.7343557598))
        make_face(mode=Mode.SUBTRACT)
    extrude(amount=-F6_DEPTH)

    # F8 (on offset) → F9 (join)
    with BuildSketch(Plane(origin=(0, 0, -25.4), x_dir=(1, 0, 0), z_dir=(0, 0, -1))):
        Circle(F8_R)
    extrude(amount=F9_DEPTH, taper=F9_TAPER)


solid = f1.part
